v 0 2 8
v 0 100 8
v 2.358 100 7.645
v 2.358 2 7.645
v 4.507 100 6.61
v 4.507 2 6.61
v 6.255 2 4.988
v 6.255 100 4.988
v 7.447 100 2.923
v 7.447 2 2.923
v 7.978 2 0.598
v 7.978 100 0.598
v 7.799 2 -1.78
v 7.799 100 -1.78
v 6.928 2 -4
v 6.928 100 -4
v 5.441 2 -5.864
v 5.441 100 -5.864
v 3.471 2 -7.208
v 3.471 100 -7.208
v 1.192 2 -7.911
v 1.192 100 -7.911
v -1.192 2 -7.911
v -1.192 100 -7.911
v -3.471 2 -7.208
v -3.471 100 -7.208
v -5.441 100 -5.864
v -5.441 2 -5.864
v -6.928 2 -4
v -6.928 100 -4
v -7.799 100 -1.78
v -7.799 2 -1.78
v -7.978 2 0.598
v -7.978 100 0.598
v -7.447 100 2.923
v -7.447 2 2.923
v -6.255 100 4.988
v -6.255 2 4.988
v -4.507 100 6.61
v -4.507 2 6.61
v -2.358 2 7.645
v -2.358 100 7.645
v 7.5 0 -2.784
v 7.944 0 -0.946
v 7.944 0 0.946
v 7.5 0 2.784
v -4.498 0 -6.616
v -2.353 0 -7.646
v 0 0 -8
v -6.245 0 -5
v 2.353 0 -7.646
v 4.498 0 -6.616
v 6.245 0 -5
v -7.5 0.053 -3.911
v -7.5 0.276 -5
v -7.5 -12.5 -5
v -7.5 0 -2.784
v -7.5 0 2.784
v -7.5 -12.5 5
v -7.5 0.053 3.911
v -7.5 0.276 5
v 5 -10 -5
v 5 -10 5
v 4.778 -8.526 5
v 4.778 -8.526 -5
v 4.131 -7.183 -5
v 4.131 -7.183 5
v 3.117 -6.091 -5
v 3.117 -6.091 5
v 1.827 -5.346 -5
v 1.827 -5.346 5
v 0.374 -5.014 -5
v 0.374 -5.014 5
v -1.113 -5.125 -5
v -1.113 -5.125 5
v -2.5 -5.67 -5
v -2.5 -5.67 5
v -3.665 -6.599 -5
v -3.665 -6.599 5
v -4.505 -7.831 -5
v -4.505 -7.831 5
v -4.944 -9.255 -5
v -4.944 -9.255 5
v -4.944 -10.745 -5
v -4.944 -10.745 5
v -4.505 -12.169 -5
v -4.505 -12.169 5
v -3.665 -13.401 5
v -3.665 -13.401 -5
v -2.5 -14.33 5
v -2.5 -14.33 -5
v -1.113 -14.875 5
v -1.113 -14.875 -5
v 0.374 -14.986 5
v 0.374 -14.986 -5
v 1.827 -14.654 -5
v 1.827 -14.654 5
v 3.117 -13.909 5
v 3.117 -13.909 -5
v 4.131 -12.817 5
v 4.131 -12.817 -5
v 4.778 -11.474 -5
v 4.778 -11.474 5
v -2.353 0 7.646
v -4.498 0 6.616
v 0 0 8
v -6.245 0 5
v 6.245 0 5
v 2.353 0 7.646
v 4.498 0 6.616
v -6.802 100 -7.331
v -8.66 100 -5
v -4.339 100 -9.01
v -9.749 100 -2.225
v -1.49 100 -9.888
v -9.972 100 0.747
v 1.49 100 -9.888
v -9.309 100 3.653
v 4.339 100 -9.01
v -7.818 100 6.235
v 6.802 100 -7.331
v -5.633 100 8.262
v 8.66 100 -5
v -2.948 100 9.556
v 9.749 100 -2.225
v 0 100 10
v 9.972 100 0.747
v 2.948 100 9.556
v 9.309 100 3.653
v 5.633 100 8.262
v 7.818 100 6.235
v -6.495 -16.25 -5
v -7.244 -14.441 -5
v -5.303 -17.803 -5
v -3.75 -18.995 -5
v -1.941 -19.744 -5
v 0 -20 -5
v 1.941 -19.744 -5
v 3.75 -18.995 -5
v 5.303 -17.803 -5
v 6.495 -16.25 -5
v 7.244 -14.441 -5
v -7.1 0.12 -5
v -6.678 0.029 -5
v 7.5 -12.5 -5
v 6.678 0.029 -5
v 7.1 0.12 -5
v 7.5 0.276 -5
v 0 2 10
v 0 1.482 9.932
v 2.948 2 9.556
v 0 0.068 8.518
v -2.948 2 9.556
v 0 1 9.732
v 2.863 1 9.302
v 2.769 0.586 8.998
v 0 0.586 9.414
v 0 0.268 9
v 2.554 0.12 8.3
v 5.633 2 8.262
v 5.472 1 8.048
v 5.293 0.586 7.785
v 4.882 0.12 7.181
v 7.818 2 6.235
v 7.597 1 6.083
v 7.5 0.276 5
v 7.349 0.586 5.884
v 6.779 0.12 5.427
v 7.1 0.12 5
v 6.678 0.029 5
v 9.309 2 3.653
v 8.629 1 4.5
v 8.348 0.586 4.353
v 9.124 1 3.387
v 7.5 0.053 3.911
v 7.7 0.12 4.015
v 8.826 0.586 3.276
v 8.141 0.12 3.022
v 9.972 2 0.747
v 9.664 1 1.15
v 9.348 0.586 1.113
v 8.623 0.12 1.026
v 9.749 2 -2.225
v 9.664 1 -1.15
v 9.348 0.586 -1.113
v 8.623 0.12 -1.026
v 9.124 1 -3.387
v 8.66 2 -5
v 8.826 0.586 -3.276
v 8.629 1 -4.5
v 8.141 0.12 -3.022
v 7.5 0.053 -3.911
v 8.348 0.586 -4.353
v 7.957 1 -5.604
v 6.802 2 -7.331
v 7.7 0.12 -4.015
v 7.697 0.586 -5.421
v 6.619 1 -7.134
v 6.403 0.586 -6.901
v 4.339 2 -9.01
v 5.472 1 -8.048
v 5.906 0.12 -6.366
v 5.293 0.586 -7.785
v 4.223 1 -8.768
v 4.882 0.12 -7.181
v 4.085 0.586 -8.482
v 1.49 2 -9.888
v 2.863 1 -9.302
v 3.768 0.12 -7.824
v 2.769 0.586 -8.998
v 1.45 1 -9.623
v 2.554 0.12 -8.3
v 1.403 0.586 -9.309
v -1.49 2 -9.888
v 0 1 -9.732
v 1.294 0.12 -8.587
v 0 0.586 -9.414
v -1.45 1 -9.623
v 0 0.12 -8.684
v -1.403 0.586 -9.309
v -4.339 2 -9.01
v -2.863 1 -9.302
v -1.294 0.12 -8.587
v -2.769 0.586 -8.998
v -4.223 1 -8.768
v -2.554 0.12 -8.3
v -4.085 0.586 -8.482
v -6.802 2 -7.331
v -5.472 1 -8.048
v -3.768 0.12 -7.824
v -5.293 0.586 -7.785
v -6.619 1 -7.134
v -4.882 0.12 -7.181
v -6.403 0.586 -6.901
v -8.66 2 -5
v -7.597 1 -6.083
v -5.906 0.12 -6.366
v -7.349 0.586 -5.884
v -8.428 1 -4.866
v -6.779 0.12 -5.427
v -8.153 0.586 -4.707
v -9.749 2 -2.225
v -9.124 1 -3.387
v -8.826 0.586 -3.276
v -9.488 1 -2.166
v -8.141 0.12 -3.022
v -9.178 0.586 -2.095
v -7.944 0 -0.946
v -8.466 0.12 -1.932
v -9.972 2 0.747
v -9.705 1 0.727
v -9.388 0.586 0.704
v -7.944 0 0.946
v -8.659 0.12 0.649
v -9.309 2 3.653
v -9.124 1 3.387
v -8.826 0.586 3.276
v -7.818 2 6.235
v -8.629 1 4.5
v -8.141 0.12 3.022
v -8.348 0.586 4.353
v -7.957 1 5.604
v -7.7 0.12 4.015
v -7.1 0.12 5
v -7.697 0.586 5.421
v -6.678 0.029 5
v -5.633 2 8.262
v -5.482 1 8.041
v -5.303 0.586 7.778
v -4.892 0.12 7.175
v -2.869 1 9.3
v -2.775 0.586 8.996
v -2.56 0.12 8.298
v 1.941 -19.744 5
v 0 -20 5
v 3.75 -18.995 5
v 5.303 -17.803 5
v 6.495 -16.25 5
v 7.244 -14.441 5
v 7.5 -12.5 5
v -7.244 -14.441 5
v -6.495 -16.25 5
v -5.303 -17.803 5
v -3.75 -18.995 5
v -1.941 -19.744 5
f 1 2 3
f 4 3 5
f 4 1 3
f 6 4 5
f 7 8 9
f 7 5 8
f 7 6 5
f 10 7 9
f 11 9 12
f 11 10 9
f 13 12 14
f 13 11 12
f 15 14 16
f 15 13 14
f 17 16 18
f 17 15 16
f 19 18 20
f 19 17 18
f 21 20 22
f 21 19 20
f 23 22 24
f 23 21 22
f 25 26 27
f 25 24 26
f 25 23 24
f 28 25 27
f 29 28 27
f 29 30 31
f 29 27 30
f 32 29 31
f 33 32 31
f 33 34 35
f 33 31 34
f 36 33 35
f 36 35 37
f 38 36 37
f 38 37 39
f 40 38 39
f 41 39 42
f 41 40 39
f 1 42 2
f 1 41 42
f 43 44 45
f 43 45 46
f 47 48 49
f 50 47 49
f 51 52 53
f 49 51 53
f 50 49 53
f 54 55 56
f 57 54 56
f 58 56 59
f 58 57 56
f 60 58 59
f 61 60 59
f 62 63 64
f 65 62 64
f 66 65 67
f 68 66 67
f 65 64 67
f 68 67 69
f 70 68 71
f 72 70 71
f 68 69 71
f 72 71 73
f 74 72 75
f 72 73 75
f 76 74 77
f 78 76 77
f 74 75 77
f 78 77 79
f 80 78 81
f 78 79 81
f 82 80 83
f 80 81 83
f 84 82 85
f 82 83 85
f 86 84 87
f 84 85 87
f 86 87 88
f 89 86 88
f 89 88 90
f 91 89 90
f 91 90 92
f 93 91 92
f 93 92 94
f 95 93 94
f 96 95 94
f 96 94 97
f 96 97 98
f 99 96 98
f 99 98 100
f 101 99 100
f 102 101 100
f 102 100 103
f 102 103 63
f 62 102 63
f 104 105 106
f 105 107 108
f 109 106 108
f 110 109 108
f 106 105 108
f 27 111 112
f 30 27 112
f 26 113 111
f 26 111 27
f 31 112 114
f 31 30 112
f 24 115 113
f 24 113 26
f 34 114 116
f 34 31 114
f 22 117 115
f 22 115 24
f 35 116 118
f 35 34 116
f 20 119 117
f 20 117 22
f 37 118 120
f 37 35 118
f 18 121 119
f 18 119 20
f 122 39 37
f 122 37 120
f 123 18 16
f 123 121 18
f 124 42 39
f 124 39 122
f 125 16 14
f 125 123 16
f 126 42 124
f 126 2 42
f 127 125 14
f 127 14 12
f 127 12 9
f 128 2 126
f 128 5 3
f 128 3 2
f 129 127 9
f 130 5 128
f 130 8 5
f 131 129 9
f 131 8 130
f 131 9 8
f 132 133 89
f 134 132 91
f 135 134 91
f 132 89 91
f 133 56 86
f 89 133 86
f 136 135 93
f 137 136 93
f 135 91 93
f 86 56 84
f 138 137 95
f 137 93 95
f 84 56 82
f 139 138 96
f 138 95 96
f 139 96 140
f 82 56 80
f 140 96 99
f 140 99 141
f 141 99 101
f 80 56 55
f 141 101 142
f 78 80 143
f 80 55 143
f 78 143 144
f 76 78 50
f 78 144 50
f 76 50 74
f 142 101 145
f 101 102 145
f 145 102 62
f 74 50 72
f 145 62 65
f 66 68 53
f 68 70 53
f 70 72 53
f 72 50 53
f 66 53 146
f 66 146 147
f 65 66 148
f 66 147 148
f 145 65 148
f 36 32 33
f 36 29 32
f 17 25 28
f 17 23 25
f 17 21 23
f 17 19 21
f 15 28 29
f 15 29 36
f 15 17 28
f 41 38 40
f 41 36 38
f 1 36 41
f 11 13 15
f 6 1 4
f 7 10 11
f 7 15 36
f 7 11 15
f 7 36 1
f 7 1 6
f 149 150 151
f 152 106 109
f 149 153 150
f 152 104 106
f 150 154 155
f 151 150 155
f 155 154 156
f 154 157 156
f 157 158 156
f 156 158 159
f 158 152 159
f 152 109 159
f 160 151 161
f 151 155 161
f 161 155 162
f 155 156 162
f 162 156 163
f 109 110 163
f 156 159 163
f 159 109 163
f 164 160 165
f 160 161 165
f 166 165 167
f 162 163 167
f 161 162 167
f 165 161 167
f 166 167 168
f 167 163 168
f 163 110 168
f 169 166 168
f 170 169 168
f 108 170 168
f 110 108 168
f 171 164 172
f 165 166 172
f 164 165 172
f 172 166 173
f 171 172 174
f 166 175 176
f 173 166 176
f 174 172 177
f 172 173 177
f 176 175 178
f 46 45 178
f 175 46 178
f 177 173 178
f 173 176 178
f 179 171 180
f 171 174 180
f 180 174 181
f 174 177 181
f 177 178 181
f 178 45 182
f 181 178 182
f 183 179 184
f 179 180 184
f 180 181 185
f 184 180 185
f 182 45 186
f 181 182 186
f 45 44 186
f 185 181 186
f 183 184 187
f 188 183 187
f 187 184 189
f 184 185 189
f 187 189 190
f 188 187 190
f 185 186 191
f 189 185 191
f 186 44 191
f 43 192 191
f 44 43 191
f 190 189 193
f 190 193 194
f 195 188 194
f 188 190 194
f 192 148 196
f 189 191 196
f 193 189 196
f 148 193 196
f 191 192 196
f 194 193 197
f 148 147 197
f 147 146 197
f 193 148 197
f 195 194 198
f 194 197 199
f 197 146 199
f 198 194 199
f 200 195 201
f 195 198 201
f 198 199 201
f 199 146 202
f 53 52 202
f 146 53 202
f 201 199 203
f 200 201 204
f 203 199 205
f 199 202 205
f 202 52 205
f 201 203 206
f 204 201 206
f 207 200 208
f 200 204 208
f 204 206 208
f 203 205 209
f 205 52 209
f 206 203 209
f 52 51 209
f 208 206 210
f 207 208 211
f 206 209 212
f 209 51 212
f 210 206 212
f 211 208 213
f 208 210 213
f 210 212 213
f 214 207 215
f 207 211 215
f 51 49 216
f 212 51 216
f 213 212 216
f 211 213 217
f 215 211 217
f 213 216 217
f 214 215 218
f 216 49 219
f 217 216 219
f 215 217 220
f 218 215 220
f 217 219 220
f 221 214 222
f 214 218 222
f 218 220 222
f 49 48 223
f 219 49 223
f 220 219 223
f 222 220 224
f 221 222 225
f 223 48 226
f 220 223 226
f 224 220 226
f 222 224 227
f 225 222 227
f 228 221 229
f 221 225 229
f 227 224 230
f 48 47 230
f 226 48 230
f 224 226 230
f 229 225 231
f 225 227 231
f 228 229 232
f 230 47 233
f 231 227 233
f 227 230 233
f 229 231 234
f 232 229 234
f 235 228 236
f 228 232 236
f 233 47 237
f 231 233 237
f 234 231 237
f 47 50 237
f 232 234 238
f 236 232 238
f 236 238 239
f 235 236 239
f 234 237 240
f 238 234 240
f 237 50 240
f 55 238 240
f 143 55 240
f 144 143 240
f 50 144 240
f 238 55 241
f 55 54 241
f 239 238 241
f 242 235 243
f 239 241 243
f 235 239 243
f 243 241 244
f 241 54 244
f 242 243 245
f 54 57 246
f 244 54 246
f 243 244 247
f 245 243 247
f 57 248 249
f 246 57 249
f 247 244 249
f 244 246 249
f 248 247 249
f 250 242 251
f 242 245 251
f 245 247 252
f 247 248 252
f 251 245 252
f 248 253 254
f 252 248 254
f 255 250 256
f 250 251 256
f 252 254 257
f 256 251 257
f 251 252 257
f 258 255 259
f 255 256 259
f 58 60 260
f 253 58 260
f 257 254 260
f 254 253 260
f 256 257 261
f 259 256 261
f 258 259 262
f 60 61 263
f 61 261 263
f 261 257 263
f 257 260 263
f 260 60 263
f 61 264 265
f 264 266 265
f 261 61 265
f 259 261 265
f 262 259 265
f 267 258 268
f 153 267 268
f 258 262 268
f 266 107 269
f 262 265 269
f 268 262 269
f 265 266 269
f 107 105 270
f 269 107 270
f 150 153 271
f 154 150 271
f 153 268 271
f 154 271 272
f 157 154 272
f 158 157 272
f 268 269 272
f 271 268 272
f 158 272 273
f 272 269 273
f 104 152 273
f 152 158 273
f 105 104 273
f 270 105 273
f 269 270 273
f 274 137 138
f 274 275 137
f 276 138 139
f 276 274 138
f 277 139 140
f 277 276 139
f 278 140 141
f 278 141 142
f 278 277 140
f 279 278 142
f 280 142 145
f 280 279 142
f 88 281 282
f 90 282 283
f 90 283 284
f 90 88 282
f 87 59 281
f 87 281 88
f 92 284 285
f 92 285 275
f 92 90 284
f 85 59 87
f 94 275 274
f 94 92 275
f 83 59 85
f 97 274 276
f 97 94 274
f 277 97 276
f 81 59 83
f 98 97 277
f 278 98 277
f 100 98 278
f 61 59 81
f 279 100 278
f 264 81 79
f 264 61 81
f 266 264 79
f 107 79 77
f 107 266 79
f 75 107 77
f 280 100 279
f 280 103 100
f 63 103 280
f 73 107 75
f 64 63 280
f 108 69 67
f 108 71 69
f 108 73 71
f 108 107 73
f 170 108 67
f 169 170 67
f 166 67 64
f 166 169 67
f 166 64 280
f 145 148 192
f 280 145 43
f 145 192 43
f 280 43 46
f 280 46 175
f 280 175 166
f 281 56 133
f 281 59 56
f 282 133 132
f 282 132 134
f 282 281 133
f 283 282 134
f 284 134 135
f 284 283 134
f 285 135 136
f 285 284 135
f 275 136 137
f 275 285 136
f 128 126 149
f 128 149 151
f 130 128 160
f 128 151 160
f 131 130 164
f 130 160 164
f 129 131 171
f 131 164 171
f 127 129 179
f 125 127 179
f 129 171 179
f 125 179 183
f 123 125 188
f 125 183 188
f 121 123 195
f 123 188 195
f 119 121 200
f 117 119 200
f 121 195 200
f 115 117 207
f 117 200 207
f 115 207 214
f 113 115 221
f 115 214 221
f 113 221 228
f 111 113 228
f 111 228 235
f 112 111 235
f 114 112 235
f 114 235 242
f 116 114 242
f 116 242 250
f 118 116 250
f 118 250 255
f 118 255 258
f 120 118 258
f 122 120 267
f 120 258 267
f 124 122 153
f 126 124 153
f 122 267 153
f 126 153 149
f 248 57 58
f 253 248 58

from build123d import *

# Parameters (mm, degrees)
SKETCH1_R                = 10
BOSS_EXTRUDE1_DEPTH      = 100
SHELL1_T                 = -2
FILLET1_R                = 2
BOSS_EXTRUDE2_DEPTH      = 20
BOSS_EXTRUDE2_DEPTH_BACK = 1
SKETCH2_W                = 15
SKETCH2_H                = 10
SKETCH3_R                = 5
CUT_EXTRUDE1_DEPTH       = 20
FILLET2_R                = 7.5


with BuildPart() as part:
    # Sketch1 → Boss-Extrude1 (new body)
    with BuildSketch(Plane(origin=(0, 0, 0), x_dir=(1, 0, 0), z_dir=(0, 1, 0))):
        with Locations(Location((0, 0, 0), (0, 0, 270))):
            Circle(SKETCH1_R)
    extrude(amount=BOSS_EXTRUDE1_DEPTH)

    # Shell1
    shell1_openings = [part.faces().sort_by_distance(p)[0] for p in [
        (0, 100, 0),
    ]]
    offset(amount=SHELL1_T, openings=shell1_openings, kind=Kind.INTERSECTION)

    # Fillet1
    fillet1_edges = [part.edges().sort_by_distance(p)[0] for p in [
        (0, 0, -10),
    ]]
    fillet(fillet1_edges, radius=FILLET1_R)

    # Sketch2 → Boss-Extrude2 (add, two sides: drawn at the far end of the back side and taken through both)
    with BuildSketch(Plane.XZ.offset(-BOSS_EXTRUDE2_DEPTH_BACK)):
        Rectangle(SKETCH2_W, SKETCH2_H)
    extrude(amount=BOSS_EXTRUDE2_DEPTH + BOSS_EXTRUDE2_DEPTH_BACK)

    # Sketch3 → Cut-Extrude1 (cut)
    with BuildSketch(Plane.XY.offset(5)):
        with Locations((0, -10)):
            Circle(SKETCH3_R)
    extrude(amount=-CUT_EXTRUDE1_DEPTH, mode=Mode.SUBTRACT)

    # Fillet2
    fillet2_edges = [part.edges().sort_by_distance(p)[0] for p in [
        (7.5, -20, 0),
        (-7.5, -20, 0),
    ]]
    fillet(fillet2_edges, radius=FILLET2_R - 0.0001)  # a hair under: the kernel refuses the full size


solid = part.part
